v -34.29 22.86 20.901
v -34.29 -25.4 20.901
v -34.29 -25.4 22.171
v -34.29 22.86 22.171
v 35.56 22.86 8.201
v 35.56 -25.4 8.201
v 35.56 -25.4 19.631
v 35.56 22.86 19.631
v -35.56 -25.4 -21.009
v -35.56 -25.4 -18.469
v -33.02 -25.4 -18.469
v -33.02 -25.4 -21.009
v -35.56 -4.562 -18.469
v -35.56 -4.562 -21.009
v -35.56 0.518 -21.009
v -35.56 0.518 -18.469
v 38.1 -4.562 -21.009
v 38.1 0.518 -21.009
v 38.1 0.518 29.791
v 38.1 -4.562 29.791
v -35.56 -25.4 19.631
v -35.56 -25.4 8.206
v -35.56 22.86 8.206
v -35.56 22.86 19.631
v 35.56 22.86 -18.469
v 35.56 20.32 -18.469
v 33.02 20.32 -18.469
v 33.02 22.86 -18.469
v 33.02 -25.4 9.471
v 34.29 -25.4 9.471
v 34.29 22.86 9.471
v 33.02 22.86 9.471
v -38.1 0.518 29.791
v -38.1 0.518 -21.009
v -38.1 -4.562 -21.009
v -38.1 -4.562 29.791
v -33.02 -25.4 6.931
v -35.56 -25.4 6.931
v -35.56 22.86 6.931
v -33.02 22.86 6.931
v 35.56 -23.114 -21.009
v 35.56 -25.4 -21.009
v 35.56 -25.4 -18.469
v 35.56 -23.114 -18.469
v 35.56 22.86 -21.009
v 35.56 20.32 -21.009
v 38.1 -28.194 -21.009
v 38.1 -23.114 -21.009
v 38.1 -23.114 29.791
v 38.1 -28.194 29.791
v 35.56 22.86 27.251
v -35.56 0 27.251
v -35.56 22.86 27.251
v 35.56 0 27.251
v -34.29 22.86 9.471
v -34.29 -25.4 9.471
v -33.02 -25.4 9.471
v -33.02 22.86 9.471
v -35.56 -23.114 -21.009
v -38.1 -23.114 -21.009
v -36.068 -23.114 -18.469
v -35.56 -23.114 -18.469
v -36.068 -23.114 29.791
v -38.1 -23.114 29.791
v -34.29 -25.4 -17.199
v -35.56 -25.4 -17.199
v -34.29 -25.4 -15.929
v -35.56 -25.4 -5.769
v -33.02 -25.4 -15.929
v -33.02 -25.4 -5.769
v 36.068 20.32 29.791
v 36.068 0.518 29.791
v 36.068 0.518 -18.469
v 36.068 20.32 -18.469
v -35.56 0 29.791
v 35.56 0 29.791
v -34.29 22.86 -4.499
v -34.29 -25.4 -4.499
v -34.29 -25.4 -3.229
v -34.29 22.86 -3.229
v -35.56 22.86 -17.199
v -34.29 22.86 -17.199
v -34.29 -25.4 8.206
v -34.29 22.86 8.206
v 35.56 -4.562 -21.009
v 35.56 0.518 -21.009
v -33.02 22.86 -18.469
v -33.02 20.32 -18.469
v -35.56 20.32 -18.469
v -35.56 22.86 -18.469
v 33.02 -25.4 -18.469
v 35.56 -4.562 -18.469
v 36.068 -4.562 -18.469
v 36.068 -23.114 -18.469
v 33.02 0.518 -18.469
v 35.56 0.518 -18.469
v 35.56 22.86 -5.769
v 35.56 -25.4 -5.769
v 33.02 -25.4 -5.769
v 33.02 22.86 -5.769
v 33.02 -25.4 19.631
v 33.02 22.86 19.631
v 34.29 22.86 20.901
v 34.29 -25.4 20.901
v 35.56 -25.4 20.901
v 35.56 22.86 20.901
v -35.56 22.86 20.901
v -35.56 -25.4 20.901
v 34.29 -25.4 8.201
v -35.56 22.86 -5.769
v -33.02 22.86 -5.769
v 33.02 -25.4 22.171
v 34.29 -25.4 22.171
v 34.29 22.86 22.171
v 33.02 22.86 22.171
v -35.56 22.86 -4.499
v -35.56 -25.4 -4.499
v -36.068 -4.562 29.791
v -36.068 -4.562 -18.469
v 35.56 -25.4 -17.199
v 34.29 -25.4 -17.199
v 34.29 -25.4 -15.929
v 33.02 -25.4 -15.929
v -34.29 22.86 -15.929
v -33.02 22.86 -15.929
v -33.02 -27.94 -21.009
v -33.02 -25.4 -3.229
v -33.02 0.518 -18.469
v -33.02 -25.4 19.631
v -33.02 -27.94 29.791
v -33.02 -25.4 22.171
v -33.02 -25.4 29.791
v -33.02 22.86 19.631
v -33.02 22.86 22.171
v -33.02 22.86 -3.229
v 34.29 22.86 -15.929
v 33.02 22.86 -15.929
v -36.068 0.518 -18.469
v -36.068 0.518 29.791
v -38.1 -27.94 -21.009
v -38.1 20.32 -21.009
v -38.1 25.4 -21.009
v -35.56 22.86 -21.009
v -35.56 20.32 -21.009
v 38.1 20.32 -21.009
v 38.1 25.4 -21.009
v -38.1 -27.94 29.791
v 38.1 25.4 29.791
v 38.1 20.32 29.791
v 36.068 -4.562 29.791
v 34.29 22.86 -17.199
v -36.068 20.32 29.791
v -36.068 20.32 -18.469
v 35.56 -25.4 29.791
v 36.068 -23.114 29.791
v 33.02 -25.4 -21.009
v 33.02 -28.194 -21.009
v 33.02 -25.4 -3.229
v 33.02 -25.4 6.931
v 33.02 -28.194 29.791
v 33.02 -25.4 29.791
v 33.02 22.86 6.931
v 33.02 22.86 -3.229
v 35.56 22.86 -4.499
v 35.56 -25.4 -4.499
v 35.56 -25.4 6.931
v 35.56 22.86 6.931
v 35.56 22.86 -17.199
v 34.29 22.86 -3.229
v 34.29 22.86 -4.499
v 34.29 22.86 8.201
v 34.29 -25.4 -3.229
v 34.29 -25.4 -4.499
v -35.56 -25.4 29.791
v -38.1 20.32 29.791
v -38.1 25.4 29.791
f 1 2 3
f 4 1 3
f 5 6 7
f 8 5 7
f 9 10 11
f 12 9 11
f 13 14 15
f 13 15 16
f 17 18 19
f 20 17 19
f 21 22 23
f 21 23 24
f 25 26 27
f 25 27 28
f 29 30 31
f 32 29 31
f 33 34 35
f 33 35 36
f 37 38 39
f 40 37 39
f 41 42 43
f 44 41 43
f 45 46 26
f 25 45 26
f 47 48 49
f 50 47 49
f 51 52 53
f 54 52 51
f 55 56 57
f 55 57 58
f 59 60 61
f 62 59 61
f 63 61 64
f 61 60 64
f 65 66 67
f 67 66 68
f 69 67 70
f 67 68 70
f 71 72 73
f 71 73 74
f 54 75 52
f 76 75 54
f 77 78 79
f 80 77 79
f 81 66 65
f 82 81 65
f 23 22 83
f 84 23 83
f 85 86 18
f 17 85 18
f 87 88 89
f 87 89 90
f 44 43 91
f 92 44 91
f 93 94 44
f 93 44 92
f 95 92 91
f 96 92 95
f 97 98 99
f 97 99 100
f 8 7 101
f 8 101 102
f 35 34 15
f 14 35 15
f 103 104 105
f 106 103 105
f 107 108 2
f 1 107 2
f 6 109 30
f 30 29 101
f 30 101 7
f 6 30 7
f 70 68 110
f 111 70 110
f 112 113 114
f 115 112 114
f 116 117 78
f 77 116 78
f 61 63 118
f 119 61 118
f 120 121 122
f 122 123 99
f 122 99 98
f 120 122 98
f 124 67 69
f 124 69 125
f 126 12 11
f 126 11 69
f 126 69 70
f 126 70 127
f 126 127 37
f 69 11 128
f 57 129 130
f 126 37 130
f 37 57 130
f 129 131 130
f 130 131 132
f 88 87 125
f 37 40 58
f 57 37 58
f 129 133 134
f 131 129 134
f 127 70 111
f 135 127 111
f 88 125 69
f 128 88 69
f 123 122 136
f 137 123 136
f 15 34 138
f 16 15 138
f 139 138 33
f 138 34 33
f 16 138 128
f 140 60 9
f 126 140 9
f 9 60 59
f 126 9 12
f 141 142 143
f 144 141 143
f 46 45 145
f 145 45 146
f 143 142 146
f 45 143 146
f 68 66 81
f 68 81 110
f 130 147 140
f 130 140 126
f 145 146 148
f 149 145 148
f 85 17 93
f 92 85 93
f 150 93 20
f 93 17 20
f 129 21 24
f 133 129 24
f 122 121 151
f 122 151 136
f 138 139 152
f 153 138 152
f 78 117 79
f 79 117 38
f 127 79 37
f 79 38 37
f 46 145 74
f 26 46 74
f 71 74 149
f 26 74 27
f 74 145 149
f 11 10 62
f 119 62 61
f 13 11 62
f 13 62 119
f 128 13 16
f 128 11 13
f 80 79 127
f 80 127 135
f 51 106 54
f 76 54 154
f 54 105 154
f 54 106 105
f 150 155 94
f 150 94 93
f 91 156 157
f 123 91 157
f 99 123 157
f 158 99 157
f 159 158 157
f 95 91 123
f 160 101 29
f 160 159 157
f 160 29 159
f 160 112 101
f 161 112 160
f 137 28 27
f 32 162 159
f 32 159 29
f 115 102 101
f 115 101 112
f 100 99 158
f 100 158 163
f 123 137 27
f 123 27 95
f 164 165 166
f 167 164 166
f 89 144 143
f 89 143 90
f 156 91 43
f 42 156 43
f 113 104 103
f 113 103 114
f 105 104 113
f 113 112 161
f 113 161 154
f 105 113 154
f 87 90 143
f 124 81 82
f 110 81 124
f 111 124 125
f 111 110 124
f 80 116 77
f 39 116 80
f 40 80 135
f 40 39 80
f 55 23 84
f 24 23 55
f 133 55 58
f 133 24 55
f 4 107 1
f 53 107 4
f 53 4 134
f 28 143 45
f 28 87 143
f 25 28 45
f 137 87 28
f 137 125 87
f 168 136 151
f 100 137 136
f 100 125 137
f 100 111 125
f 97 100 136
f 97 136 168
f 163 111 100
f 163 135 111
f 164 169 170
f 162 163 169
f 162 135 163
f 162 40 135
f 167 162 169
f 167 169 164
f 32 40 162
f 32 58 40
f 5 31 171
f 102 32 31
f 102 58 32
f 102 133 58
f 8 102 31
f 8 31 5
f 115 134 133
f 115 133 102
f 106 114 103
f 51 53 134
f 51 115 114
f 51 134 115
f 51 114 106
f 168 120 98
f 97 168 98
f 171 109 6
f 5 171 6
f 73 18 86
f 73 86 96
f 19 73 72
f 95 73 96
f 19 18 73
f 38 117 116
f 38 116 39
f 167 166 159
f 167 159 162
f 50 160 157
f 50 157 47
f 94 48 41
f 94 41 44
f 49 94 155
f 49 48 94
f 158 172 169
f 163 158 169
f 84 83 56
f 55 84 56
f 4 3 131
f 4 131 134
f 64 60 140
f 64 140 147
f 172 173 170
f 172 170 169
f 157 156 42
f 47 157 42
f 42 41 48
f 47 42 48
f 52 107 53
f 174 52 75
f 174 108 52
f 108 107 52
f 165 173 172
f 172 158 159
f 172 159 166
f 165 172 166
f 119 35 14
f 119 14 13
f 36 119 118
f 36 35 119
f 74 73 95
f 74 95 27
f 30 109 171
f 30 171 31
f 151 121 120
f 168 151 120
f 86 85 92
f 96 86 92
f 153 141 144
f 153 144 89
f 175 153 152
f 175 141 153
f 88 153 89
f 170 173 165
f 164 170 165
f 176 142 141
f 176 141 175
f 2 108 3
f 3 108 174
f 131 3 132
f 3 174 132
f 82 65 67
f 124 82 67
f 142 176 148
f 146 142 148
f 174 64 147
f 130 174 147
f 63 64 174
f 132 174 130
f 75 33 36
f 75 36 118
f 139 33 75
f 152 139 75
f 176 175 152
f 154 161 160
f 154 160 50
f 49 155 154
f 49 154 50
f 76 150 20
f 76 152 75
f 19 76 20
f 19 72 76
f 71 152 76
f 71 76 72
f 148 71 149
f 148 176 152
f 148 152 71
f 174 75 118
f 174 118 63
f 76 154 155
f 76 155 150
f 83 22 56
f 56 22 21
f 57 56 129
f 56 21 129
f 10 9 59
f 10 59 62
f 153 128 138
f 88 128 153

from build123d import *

# Parameters (mm, degrees)
F0_W          = 76.2
F0_H          = 50.8
F1_DEPTH      = 25.4
F1_DEPTH_BACK = 25.4
F2_W          = 71.12
F2_H          = 50.8
F3_DEPTH      = 25.4
F4_W          = 71.12
F4_H          = 48.26
F5_DEPTH      = 22.86
F6_W          = 48.26
F6_H          = 2.54
F7_DEPTH      = 2.54
F8_W          = 48.26
F8_H          = 2.54
F9_DEPTH      = 2.54
F10_W         = 48.26
F10_H         = 2.54
F11_DEPTH     = 2.54
F12_W         = 48.26
F12_H         = 2.54
F13_DEPTH     = 2.54
F15_W         = 1.27
F15_H         = 1.27
F16_DEPTH     = 48.26
F17_W         = 1.27
F17_H         = 1.27
F18_DEPTH     = 48.26
F19_W         = 1.27
F19_H         = 1.2642855102
F20_DEPTH     = 48.26
F21_W         = 1.27
F21_H         = 1.27
F22_DEPTH     = 48.26
F23_W         = 1.27
F23_H         = 1.27
F24_DEPTH     = 48.26
F25_W         = 1.27
F25_H         = 1.27
F26_DEPTH     = 48.26
F27_W         = 1.27
F27_H         = 1.27
F28_DEPTH     = 48.26
F29_W         = 1.27
F29_H         = 1.27
F30_DEPTH     = 48.26
F31_W         = 5.08
F31_H         = 50.8
F32_DEPTH     = 2.794
F33_W         = 5.08
F33_H         = 50.8
F34_DEPTH     = 2.54
F35_W         = 18.5524672455
F35_H         = 50.8
F35_W_2       = 19.8015327545
F36_DEPTH     = 2.032
F37_W         = 18.5524672455
F37_H         = 2.54
F38_DEPTH     = 74.169
F39_W         = 19.8015327545
F39_H         = 2.5402396598
F40_DEPTH     = 74.169


# Not quite as in the source:
# - a pattern or mirror of a feature is missing from the dataset's text; its kind, count and spacing are read off the source's solid


with BuildPart() as f1:
    # F0 (on Front) → F1 (new body, two sides)
    with BuildSketch(Plane.XZ) as f1_sk:
        with Locations((0, 4.3905831537)):
            Rectangle(F0_W, F0_H)
    extrude(amount=F1_DEPTH)
    extrude(f1_sk.sketch, amount=-F1_DEPTH_BACK)

    # F2 (on face) → F3 (cut)
    with BuildSketch(Plane.XZ.offset(25.4)):
        with Locations((0, 4.3905831537)):
            Rectangle(F2_W, F2_H)
    extrude(amount=-F3_DEPTH, mode=Mode.SUBTRACT)

    # F4 (on face) → F5 (cut)
    with BuildSketch(Plane.XZ):
        with Locations((0, 3.1205831537)):
            Rectangle(F4_W, F4_H)
    extrude(amount=-F5_DEPTH, mode=Mode.SUBTRACT)

    # F6 (on face) → F7 (join)
    with BuildSketch(Plane.YZ.offset(-35.56)):
        with Locations((-1.27, -17.1994168463)):
            Rectangle(F6_W, F6_H)
    extrude(amount=F7_DEPTH)

    # F8 (on face) → F9 (join)
    with BuildSketch(Plane.YZ.offset(-35.56)):
        with Locations((-1.27, -4.4994168463)):
            Rectangle(F8_W, F8_H)
    extrude(amount=F9_DEPTH)

    # F10 (on face) → F11 (join)
    with BuildSketch(Plane.YZ.offset(-35.56)):
        with Locations((-1.27, 8.2005831537)):
            Rectangle(F10_W, F10_H)
    extrude(amount=F11_DEPTH)

    # F12 (on face) → F13 (join)
    with BuildSketch(Plane.YZ.offset(-35.56)):
        with Locations((-1.27, 20.9005831537)):
            Rectangle(F12_W, F12_H)
    extrude(amount=F13_DEPTH)

    # F14: F1 across plane


with BuildPart() as f1_1:
    add(f1.part)
    add(f1.part.mirror(Plane.YZ))

    # F15 (on face) → F16 (cut)
    with BuildSketch(Plane.XZ.offset(25.4)):
        with Locations((-34.925, -16.5644168463)):
            Rectangle(F15_W, F15_H)
    extrude(amount=-F16_DEPTH, mode=Mode.SUBTRACT)

    # F17 (on face) → F18 (cut)
    with BuildSketch(Plane.XZ.offset(25.4)):
        with Locations((-34.925, -3.8644168463)):
            Rectangle(F17_W, F17_H)
    extrude(amount=-F18_DEPTH, mode=Mode.SUBTRACT)

    # F19 (on face) → F20 (cut)
    with BuildSketch(Plane.XZ.offset(25.4)):
        with Locations((-34.925, 8.8384403986)):
            Rectangle(F19_W, F19_H)
    extrude(amount=-F20_DEPTH, mode=Mode.SUBTRACT)

    # F21 (on face) → F22 (cut)
    with BuildSketch(Plane.XZ.offset(25.4)):
        with Locations((-34.925, 21.5355831537)):
            Rectangle(F21_W, F21_H)
    extrude(amount=-F22_DEPTH, mode=Mode.SUBTRACT)

    # F23 (on face) → F24 (cut)
    with BuildSketch(Plane.XZ.offset(25.4)):
        with Locations((34.925, 21.5355831537)):
            Rectangle(F23_W, F23_H)
    extrude(amount=-F24_DEPTH, mode=Mode.SUBTRACT)

    # F25 (on face) → F26 (cut)
    with BuildSketch(Plane.XZ.offset(25.4)):
        with Locations((34.925, 8.8355831537)):
            Rectangle(F25_W, F25_H)
    extrude(amount=-F26_DEPTH, mode=Mode.SUBTRACT)

    # F27 (on face) → F28 (cut)
    with BuildSketch(Plane.XZ.offset(25.4)):
        with Locations((34.925, -3.8644168463)):
            Rectangle(F27_W, F27_H)
    extrude(amount=-F28_DEPTH, mode=Mode.SUBTRACT)

    # F29 (on face) → F30 (cut)
    with BuildSketch(Plane.XZ.offset(25.4)):
        with Locations((34.925, -16.5644168463)):
            Rectangle(F29_W, F29_H)
    extrude(amount=-F30_DEPTH, mode=Mode.SUBTRACT)

    # F31 (on face) → F32 (join)
    with BuildSketch(Plane.XZ.offset(25.4)):
        with Locations((35.56, 4.3905831537)):
            Rectangle(F31_W, F31_H)
    extrude(amount=F32_DEPTH)

    # F33 (on face) → F34 (join)
    with BuildSketch(Plane.XZ.offset(25.4)):
        with Locations((-35.56, 4.3905831537)):
            Rectangle(F33_W, F33_H)
    extrude(amount=F34_DEPTH)

    # F35 (on face) → F36 (cut)
    with BuildSketch(Plane.YZ.offset(38.1)):
        with Locations((-13.8377663772, 4.3905831537)):
            Rectangle(F35_W, F35_H)
        with Locations((10.4192336228, 4.3905831537)):
            Rectangle(F35_W_2, F35_H)
    f36 = extrude(amount=-F36_DEPTH, mode=Mode.SUBTRACT)

    # F36_copies: F36 across plane
    add(f36.mirror(Plane(origin=(0, 0, 0), x_dir=(0, 0, -1), z_dir=(-1, 0, 0))), mode=Mode.SUBTRACT)

    # F37 (on face) → F38 (cut, through all)
    with BuildSketch(Plane.YZ.offset(36.068)):
        with Locations((-13.8377663772, -19.7394168463)):
            Rectangle(F37_W, F37_H)
    extrude(amount=-F38_DEPTH, mode=Mode.SUBTRACT)

    # F39 (on face) → F40 (cut, through all)
    with BuildSketch(Plane.YZ.offset(36.068)):
        with Locations((10.4192336228, -19.7392970164)):
            Rectangle(F39_W, F39_H)
    extrude(amount=-F40_DEPTH, mode=Mode.SUBTRACT)


solid = f1_1.part
